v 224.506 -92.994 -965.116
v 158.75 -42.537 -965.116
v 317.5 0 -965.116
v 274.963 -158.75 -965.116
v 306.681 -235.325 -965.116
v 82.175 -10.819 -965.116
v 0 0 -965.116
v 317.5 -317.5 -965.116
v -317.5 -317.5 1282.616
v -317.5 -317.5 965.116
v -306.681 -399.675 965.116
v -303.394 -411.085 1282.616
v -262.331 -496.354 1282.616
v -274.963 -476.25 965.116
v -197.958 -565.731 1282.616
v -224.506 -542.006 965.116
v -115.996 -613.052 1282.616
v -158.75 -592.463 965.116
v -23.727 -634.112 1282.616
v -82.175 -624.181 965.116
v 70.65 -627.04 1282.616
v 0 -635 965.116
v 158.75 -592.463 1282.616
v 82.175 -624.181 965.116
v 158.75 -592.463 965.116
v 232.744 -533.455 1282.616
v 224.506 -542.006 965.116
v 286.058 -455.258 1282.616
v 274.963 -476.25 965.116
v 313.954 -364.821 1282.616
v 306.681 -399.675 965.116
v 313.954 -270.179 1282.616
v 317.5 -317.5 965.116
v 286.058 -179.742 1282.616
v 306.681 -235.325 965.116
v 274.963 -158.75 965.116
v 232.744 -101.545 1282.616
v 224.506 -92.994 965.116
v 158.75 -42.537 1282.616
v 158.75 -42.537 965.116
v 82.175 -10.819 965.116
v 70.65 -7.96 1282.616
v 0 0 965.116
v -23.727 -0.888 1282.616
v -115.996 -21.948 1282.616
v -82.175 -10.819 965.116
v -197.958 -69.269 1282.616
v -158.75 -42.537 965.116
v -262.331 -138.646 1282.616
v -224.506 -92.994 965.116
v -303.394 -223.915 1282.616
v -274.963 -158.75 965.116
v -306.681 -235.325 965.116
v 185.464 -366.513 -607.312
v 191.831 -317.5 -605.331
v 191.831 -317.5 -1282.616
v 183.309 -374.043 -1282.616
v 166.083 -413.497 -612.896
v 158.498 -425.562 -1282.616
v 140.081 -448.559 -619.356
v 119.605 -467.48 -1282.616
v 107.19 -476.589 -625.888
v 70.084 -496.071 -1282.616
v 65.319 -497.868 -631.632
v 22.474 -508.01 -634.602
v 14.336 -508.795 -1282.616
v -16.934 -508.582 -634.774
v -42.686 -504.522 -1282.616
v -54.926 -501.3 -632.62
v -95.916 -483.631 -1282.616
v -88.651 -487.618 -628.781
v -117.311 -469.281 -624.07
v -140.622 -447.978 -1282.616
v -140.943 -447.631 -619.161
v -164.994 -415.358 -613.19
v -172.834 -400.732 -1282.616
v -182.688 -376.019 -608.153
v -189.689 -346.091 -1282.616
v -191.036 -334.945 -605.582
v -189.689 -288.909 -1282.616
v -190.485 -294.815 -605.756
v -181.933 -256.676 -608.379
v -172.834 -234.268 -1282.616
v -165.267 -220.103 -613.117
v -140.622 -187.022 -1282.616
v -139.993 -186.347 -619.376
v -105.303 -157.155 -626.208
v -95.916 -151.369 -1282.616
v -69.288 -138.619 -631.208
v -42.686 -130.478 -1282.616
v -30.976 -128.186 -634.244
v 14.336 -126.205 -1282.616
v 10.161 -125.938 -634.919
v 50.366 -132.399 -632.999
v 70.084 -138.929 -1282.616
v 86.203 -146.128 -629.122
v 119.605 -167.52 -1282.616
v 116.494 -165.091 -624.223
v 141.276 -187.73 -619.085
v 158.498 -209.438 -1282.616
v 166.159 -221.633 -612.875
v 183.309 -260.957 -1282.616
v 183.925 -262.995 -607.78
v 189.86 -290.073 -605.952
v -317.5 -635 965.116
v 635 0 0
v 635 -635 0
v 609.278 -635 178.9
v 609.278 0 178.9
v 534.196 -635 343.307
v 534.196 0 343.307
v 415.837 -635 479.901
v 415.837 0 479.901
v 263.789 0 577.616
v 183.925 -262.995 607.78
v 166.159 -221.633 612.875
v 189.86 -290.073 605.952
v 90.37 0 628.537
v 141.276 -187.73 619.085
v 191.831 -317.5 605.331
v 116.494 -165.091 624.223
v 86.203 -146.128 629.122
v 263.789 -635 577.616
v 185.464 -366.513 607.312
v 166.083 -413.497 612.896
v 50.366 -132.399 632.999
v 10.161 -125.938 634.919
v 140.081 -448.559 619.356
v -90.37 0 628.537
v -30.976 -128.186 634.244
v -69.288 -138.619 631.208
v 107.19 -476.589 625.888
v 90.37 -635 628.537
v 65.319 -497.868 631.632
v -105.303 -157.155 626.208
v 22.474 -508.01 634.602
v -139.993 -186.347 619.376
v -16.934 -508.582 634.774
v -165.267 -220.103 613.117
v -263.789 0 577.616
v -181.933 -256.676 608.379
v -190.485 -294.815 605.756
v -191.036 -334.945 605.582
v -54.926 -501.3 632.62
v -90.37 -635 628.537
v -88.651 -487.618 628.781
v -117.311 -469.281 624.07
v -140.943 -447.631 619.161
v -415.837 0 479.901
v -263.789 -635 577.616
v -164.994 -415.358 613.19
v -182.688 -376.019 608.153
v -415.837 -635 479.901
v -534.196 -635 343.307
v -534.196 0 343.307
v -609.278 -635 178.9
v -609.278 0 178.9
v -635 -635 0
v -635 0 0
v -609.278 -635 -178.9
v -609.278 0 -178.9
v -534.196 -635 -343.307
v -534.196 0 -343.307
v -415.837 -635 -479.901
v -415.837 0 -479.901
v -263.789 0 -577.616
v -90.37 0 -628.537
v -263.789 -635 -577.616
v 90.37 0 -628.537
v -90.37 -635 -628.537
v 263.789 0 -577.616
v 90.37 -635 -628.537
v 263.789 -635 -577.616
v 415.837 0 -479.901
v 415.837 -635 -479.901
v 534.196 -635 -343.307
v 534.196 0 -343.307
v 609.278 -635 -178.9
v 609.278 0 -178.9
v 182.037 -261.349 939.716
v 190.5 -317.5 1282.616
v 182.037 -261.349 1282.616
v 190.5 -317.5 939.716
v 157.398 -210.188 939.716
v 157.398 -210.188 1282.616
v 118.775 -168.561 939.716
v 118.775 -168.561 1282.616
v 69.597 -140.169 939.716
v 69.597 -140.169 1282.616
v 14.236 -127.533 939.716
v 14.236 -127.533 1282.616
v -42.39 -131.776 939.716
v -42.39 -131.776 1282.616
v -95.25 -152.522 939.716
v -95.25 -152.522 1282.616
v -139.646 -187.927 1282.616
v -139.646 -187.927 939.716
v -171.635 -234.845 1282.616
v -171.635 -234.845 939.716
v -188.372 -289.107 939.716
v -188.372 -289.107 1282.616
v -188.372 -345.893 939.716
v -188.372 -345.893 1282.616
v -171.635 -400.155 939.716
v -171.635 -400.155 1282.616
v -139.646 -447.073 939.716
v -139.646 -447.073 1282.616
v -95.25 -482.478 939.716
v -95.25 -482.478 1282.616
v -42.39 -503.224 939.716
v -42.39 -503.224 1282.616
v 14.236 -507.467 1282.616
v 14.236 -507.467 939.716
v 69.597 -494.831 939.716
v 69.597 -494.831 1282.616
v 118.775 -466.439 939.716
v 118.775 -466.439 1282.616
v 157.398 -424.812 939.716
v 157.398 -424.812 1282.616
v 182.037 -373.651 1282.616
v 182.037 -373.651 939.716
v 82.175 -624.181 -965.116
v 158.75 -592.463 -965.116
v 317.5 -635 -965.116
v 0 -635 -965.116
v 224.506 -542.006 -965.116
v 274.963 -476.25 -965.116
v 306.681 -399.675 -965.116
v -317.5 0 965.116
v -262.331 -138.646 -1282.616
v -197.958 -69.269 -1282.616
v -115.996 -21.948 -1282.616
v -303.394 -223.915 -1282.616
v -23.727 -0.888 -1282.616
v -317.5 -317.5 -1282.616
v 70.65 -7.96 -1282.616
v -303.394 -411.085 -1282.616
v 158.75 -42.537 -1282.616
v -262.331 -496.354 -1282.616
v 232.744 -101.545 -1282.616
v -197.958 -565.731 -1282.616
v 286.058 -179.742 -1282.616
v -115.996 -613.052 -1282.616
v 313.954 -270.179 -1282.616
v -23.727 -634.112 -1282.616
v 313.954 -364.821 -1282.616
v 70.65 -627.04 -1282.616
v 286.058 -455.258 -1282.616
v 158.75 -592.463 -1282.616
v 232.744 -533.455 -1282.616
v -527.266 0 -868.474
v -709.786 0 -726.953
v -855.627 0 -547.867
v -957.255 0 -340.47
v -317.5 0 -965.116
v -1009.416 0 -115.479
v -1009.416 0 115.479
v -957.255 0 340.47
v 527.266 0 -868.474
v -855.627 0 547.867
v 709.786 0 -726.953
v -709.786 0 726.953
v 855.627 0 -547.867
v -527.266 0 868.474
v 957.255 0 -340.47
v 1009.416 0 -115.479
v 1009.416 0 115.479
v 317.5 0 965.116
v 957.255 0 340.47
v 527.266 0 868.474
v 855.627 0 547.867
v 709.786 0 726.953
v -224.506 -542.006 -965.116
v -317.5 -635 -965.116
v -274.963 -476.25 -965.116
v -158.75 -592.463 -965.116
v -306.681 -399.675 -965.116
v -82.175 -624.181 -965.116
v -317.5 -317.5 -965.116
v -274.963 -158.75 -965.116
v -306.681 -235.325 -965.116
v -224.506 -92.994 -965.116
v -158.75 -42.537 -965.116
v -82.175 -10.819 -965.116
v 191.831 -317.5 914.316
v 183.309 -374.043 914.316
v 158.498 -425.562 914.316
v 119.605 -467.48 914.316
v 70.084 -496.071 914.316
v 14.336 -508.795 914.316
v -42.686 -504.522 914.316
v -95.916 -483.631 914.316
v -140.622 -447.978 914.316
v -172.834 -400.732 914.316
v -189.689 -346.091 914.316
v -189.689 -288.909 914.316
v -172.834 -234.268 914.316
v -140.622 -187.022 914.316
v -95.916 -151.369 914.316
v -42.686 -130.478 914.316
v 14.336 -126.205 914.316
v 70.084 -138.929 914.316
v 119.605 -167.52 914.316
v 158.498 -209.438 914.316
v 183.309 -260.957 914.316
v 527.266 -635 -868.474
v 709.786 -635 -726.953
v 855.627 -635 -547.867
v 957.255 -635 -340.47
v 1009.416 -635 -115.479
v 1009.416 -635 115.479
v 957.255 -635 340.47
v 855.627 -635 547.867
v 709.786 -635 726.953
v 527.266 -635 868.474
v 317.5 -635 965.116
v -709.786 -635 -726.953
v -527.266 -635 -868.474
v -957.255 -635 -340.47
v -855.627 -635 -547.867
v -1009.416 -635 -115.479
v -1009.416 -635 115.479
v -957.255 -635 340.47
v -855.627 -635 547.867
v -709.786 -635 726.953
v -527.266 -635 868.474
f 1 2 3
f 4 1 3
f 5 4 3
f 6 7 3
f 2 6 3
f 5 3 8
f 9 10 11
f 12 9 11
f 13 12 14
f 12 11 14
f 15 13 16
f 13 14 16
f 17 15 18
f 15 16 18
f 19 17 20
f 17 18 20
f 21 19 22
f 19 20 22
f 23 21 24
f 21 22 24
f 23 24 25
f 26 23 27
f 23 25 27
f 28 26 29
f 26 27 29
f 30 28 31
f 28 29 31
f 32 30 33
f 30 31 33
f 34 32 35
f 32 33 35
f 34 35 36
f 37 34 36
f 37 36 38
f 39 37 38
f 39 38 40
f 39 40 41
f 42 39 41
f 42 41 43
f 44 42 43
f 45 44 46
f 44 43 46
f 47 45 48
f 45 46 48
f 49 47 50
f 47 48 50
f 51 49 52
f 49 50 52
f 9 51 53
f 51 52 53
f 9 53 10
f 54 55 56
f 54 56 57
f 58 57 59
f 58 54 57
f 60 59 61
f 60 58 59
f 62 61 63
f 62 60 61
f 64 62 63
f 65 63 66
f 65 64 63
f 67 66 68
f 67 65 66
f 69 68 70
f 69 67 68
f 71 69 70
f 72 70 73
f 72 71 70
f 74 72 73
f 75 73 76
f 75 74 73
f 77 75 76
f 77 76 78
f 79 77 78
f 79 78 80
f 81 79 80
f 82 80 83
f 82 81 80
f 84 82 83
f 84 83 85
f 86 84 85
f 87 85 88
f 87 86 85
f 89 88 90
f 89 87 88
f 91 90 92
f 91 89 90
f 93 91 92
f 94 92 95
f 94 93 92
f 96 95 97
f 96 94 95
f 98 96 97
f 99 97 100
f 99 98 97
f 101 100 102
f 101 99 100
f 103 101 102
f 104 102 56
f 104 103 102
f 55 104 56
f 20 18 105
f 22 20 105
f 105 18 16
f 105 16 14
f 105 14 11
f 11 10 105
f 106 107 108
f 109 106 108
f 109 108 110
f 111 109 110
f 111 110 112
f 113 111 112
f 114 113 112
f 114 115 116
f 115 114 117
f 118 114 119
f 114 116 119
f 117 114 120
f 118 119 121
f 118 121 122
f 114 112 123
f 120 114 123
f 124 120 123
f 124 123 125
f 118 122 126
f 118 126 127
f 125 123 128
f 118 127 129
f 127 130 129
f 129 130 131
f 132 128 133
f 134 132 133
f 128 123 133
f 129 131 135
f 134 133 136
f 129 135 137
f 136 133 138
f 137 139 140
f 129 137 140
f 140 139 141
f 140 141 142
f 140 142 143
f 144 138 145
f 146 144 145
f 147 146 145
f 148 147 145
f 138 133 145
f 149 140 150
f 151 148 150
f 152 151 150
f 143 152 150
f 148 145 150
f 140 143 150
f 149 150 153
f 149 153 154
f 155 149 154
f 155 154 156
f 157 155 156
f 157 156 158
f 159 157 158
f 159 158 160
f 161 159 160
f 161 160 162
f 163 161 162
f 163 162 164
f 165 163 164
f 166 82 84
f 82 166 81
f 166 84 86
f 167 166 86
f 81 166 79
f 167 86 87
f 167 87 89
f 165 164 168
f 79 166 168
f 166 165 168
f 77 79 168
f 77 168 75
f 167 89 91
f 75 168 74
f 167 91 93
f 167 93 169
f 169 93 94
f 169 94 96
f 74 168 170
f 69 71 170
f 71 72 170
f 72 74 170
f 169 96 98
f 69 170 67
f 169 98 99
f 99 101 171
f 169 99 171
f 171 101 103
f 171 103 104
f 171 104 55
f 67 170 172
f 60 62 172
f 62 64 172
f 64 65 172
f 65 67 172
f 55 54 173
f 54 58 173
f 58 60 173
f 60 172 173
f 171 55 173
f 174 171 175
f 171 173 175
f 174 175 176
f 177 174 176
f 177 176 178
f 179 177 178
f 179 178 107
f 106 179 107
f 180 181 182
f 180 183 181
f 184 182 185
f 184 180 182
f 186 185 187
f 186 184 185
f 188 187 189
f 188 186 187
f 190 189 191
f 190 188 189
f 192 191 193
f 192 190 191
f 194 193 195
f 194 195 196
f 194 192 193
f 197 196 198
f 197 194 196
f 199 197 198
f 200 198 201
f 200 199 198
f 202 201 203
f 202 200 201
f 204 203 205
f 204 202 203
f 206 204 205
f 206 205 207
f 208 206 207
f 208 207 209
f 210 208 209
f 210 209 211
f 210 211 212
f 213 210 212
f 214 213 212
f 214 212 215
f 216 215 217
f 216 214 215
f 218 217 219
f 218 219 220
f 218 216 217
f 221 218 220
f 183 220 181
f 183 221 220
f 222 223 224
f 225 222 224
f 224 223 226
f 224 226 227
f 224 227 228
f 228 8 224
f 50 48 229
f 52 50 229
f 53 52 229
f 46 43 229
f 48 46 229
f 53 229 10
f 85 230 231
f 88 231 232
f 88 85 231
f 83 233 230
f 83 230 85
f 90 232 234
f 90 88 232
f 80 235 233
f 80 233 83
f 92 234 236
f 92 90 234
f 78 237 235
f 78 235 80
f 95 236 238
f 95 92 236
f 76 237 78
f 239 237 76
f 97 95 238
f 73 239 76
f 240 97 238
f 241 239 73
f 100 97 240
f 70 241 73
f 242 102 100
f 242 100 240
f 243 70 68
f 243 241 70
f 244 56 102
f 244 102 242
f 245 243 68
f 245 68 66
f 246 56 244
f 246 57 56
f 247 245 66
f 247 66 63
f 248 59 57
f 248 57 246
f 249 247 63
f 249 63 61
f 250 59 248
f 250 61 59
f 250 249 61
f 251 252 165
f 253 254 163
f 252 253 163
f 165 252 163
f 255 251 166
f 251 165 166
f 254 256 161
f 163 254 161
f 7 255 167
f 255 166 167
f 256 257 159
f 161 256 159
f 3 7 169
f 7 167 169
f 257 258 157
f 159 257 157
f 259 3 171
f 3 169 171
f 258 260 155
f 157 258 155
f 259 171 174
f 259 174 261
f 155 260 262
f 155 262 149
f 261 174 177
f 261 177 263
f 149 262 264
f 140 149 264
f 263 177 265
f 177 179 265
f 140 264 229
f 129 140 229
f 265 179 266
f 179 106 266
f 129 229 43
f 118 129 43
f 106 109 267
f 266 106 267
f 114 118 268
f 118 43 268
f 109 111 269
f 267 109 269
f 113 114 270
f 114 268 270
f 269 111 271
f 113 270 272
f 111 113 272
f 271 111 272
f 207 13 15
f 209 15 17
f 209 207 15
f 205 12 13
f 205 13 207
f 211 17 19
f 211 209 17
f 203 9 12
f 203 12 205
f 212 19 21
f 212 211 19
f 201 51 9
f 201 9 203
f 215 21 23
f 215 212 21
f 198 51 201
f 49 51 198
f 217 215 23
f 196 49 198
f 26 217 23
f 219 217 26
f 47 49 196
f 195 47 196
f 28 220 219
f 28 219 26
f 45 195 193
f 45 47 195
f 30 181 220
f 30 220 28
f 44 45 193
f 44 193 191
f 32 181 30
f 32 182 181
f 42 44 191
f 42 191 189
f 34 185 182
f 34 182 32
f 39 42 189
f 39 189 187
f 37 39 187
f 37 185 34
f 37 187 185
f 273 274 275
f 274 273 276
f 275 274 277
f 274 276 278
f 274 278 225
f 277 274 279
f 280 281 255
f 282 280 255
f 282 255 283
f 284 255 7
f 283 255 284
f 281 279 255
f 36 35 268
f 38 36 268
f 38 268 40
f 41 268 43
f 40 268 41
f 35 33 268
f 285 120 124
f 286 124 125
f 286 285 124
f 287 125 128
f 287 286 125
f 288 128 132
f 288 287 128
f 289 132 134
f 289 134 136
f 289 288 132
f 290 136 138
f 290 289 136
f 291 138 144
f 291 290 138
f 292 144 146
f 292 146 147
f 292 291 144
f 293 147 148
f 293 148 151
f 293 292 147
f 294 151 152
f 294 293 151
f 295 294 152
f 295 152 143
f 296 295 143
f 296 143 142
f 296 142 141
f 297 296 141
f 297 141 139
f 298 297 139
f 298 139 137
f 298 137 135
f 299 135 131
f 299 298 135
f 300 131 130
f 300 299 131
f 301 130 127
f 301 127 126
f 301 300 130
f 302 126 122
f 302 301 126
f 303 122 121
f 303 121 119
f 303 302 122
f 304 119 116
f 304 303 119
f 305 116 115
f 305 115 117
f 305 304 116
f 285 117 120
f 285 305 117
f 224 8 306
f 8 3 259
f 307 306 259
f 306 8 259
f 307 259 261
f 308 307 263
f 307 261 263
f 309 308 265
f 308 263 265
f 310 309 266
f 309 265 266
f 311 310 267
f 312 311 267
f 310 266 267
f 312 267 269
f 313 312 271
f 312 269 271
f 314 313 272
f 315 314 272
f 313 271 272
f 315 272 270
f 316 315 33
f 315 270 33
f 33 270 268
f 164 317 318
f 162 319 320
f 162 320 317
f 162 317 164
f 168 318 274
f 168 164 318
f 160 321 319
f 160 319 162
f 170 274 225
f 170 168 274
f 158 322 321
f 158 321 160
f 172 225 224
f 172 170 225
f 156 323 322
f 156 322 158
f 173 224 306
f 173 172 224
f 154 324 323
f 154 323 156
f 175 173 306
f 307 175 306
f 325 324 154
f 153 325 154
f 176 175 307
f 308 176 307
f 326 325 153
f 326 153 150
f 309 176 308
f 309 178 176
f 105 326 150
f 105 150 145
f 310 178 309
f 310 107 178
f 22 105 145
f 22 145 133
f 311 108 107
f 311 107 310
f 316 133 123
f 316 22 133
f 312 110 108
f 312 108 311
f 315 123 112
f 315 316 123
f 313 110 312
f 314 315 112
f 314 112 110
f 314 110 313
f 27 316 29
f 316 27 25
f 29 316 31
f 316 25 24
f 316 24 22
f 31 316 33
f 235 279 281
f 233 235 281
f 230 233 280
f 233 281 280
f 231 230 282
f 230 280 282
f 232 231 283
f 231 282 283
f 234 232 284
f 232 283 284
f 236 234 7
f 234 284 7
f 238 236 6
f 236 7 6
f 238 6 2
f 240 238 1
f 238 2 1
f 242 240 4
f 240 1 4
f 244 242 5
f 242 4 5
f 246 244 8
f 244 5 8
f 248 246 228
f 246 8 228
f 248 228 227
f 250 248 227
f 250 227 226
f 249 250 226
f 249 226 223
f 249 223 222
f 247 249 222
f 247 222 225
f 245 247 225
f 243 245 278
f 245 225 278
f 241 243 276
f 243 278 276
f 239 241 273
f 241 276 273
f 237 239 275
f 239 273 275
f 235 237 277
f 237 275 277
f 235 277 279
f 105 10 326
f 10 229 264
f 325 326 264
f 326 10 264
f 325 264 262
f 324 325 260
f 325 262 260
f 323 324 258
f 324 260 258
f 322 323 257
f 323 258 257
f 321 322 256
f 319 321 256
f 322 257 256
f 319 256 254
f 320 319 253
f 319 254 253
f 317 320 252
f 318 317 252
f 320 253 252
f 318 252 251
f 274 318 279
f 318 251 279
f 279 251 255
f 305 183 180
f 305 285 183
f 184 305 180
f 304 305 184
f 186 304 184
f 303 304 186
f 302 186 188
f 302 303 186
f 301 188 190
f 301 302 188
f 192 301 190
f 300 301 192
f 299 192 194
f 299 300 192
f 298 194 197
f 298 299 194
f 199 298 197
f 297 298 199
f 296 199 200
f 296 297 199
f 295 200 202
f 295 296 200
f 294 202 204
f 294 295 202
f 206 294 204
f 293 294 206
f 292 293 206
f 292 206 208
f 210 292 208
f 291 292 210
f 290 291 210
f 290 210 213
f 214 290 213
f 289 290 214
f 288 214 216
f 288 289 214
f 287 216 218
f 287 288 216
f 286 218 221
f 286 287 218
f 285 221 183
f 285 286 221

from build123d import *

# Parameters (mm, degrees)
F0_R      = 635
F1_DEPTH  = 635
F2_R      = 190.5
F3_DEPTH  = 317.5
F4_DEPTH  = 25.4
F4_FACE_R = 190.5
F5_DEPTH  = 25.4
F5_TAPER  = -3
F6_DEPTH  = 1879.4338875035
F8_R      = 191.8311575938
F9_DEPTH  = 317.5
F10_R     = 635
F11_DEPTH = 635.001


with BuildPart() as f1:
    # F0 (on Front) → F1 (new body)
    with BuildSketch(Plane.XZ):
        with BuildLine():
            Line((317.5, 965.1164437517), (-317.5, 965.1164437517))
            ThreePointArc((-317.5, 965.1164437517), (-1016, 0), (-317.5, -965.1164437517))
            Line((-317.5, -965.1164437517), (317.5, -965.1164437517))
            ThreePointArc((317.5, -965.1164437517), (1016, 0), (317.5, 965.1164437517))
        make_face()
        Circle(F0_R, mode=Mode.SUBTRACT)
        Circle(F0_R)
    extrude(amount=F1_DEPTH)

    # F2 (on face) → F3 (join)
    with BuildSketch(Plane.XY.offset(965.1164437517)):
        with BuildLine():
            ThreePointArc((9.495e-07, -635), (224.5064033624, -542.006402691), (317.5, -317.5))
            ThreePointArc((317.5, -317.5), (224.5064033905, -92.993597337), (1.0289e-06, 0))
            ThreePointArc((1.0289e-06, 0), (-224.506402663, -92.9935966095), (-317.5, -317.5))
            ThreePointArc((-317.5, -317.5), (-224.506402691, -542.0064033624), (9.495e-07, -635))
        make_face()
        with Locations((0, -317.5)):
            Circle(F2_R, mode=Mode.SUBTRACT)
    extrude(amount=F3_DEPTH)

    # F4 (cut): a face of the model
    f4_faces = [f1.faces().sort_by_distance(p)[0] for p in [
        (0, -317.5, 965.1164437517),
    ]]
    extrude(f4_faces, amount=-F4_DEPTH, mode=Mode.SUBTRACT)

    # F4_face (on face) → F5 (cut)
    with BuildSketch(Plane(origin=(0, -317.5, 939.7164437517), x_dir=(1, 0, 0), z_dir=(0, 0, 1))):
        Circle(F4_FACE_R)
    extrude(amount=-F5_DEPTH, taper=F5_TAPER, mode=Mode.SUBTRACT)

    # F6 (cut, through all): a face of the model
    f6_faces = [f1.faces().sort_by_distance(p)[0] for p in [
        (0, -317.5, 914.3164437517),
    ]]
    extrude(f6_faces, amount=-F6_DEPTH, mode=Mode.SUBTRACT)

    # F8 (on face) → F9 (join)
    with BuildSketch(Plane(origin=(0, 0, -965.1164437517), x_dir=(1, 0, 0), z_dir=(0, 0, -1))):
        with BuildLine():
            ThreePointArc((3.841e-07, 0), (224.5064031625, 92.9935971091), (317.5, 317.5))
            ThreePointArc((317.5, 317.5), (224.5064035631, 542.0064024903), (1.5171e-06, 635))
            ThreePointArc((1.5171e-06, 635), (-224.5064024903, 542.0064035631), (-317.5, 317.5))
            ThreePointArc((-317.5, 317.5), (-224.5064028909, 92.9935968375), (3.841e-07, 0))
        make_face()
        with Locations((0, 317.5)):
            Circle(F8_R, mode=Mode.SUBTRACT)
    extrude(amount=F9_DEPTH)

    # F10 (on face) → F11 (cut, through all)
    with BuildSketch(Plane.XZ.offset(635)):
        Circle(F10_R)
    extrude(amount=-F11_DEPTH, mode=Mode.SUBTRACT)


solid = f1.part
